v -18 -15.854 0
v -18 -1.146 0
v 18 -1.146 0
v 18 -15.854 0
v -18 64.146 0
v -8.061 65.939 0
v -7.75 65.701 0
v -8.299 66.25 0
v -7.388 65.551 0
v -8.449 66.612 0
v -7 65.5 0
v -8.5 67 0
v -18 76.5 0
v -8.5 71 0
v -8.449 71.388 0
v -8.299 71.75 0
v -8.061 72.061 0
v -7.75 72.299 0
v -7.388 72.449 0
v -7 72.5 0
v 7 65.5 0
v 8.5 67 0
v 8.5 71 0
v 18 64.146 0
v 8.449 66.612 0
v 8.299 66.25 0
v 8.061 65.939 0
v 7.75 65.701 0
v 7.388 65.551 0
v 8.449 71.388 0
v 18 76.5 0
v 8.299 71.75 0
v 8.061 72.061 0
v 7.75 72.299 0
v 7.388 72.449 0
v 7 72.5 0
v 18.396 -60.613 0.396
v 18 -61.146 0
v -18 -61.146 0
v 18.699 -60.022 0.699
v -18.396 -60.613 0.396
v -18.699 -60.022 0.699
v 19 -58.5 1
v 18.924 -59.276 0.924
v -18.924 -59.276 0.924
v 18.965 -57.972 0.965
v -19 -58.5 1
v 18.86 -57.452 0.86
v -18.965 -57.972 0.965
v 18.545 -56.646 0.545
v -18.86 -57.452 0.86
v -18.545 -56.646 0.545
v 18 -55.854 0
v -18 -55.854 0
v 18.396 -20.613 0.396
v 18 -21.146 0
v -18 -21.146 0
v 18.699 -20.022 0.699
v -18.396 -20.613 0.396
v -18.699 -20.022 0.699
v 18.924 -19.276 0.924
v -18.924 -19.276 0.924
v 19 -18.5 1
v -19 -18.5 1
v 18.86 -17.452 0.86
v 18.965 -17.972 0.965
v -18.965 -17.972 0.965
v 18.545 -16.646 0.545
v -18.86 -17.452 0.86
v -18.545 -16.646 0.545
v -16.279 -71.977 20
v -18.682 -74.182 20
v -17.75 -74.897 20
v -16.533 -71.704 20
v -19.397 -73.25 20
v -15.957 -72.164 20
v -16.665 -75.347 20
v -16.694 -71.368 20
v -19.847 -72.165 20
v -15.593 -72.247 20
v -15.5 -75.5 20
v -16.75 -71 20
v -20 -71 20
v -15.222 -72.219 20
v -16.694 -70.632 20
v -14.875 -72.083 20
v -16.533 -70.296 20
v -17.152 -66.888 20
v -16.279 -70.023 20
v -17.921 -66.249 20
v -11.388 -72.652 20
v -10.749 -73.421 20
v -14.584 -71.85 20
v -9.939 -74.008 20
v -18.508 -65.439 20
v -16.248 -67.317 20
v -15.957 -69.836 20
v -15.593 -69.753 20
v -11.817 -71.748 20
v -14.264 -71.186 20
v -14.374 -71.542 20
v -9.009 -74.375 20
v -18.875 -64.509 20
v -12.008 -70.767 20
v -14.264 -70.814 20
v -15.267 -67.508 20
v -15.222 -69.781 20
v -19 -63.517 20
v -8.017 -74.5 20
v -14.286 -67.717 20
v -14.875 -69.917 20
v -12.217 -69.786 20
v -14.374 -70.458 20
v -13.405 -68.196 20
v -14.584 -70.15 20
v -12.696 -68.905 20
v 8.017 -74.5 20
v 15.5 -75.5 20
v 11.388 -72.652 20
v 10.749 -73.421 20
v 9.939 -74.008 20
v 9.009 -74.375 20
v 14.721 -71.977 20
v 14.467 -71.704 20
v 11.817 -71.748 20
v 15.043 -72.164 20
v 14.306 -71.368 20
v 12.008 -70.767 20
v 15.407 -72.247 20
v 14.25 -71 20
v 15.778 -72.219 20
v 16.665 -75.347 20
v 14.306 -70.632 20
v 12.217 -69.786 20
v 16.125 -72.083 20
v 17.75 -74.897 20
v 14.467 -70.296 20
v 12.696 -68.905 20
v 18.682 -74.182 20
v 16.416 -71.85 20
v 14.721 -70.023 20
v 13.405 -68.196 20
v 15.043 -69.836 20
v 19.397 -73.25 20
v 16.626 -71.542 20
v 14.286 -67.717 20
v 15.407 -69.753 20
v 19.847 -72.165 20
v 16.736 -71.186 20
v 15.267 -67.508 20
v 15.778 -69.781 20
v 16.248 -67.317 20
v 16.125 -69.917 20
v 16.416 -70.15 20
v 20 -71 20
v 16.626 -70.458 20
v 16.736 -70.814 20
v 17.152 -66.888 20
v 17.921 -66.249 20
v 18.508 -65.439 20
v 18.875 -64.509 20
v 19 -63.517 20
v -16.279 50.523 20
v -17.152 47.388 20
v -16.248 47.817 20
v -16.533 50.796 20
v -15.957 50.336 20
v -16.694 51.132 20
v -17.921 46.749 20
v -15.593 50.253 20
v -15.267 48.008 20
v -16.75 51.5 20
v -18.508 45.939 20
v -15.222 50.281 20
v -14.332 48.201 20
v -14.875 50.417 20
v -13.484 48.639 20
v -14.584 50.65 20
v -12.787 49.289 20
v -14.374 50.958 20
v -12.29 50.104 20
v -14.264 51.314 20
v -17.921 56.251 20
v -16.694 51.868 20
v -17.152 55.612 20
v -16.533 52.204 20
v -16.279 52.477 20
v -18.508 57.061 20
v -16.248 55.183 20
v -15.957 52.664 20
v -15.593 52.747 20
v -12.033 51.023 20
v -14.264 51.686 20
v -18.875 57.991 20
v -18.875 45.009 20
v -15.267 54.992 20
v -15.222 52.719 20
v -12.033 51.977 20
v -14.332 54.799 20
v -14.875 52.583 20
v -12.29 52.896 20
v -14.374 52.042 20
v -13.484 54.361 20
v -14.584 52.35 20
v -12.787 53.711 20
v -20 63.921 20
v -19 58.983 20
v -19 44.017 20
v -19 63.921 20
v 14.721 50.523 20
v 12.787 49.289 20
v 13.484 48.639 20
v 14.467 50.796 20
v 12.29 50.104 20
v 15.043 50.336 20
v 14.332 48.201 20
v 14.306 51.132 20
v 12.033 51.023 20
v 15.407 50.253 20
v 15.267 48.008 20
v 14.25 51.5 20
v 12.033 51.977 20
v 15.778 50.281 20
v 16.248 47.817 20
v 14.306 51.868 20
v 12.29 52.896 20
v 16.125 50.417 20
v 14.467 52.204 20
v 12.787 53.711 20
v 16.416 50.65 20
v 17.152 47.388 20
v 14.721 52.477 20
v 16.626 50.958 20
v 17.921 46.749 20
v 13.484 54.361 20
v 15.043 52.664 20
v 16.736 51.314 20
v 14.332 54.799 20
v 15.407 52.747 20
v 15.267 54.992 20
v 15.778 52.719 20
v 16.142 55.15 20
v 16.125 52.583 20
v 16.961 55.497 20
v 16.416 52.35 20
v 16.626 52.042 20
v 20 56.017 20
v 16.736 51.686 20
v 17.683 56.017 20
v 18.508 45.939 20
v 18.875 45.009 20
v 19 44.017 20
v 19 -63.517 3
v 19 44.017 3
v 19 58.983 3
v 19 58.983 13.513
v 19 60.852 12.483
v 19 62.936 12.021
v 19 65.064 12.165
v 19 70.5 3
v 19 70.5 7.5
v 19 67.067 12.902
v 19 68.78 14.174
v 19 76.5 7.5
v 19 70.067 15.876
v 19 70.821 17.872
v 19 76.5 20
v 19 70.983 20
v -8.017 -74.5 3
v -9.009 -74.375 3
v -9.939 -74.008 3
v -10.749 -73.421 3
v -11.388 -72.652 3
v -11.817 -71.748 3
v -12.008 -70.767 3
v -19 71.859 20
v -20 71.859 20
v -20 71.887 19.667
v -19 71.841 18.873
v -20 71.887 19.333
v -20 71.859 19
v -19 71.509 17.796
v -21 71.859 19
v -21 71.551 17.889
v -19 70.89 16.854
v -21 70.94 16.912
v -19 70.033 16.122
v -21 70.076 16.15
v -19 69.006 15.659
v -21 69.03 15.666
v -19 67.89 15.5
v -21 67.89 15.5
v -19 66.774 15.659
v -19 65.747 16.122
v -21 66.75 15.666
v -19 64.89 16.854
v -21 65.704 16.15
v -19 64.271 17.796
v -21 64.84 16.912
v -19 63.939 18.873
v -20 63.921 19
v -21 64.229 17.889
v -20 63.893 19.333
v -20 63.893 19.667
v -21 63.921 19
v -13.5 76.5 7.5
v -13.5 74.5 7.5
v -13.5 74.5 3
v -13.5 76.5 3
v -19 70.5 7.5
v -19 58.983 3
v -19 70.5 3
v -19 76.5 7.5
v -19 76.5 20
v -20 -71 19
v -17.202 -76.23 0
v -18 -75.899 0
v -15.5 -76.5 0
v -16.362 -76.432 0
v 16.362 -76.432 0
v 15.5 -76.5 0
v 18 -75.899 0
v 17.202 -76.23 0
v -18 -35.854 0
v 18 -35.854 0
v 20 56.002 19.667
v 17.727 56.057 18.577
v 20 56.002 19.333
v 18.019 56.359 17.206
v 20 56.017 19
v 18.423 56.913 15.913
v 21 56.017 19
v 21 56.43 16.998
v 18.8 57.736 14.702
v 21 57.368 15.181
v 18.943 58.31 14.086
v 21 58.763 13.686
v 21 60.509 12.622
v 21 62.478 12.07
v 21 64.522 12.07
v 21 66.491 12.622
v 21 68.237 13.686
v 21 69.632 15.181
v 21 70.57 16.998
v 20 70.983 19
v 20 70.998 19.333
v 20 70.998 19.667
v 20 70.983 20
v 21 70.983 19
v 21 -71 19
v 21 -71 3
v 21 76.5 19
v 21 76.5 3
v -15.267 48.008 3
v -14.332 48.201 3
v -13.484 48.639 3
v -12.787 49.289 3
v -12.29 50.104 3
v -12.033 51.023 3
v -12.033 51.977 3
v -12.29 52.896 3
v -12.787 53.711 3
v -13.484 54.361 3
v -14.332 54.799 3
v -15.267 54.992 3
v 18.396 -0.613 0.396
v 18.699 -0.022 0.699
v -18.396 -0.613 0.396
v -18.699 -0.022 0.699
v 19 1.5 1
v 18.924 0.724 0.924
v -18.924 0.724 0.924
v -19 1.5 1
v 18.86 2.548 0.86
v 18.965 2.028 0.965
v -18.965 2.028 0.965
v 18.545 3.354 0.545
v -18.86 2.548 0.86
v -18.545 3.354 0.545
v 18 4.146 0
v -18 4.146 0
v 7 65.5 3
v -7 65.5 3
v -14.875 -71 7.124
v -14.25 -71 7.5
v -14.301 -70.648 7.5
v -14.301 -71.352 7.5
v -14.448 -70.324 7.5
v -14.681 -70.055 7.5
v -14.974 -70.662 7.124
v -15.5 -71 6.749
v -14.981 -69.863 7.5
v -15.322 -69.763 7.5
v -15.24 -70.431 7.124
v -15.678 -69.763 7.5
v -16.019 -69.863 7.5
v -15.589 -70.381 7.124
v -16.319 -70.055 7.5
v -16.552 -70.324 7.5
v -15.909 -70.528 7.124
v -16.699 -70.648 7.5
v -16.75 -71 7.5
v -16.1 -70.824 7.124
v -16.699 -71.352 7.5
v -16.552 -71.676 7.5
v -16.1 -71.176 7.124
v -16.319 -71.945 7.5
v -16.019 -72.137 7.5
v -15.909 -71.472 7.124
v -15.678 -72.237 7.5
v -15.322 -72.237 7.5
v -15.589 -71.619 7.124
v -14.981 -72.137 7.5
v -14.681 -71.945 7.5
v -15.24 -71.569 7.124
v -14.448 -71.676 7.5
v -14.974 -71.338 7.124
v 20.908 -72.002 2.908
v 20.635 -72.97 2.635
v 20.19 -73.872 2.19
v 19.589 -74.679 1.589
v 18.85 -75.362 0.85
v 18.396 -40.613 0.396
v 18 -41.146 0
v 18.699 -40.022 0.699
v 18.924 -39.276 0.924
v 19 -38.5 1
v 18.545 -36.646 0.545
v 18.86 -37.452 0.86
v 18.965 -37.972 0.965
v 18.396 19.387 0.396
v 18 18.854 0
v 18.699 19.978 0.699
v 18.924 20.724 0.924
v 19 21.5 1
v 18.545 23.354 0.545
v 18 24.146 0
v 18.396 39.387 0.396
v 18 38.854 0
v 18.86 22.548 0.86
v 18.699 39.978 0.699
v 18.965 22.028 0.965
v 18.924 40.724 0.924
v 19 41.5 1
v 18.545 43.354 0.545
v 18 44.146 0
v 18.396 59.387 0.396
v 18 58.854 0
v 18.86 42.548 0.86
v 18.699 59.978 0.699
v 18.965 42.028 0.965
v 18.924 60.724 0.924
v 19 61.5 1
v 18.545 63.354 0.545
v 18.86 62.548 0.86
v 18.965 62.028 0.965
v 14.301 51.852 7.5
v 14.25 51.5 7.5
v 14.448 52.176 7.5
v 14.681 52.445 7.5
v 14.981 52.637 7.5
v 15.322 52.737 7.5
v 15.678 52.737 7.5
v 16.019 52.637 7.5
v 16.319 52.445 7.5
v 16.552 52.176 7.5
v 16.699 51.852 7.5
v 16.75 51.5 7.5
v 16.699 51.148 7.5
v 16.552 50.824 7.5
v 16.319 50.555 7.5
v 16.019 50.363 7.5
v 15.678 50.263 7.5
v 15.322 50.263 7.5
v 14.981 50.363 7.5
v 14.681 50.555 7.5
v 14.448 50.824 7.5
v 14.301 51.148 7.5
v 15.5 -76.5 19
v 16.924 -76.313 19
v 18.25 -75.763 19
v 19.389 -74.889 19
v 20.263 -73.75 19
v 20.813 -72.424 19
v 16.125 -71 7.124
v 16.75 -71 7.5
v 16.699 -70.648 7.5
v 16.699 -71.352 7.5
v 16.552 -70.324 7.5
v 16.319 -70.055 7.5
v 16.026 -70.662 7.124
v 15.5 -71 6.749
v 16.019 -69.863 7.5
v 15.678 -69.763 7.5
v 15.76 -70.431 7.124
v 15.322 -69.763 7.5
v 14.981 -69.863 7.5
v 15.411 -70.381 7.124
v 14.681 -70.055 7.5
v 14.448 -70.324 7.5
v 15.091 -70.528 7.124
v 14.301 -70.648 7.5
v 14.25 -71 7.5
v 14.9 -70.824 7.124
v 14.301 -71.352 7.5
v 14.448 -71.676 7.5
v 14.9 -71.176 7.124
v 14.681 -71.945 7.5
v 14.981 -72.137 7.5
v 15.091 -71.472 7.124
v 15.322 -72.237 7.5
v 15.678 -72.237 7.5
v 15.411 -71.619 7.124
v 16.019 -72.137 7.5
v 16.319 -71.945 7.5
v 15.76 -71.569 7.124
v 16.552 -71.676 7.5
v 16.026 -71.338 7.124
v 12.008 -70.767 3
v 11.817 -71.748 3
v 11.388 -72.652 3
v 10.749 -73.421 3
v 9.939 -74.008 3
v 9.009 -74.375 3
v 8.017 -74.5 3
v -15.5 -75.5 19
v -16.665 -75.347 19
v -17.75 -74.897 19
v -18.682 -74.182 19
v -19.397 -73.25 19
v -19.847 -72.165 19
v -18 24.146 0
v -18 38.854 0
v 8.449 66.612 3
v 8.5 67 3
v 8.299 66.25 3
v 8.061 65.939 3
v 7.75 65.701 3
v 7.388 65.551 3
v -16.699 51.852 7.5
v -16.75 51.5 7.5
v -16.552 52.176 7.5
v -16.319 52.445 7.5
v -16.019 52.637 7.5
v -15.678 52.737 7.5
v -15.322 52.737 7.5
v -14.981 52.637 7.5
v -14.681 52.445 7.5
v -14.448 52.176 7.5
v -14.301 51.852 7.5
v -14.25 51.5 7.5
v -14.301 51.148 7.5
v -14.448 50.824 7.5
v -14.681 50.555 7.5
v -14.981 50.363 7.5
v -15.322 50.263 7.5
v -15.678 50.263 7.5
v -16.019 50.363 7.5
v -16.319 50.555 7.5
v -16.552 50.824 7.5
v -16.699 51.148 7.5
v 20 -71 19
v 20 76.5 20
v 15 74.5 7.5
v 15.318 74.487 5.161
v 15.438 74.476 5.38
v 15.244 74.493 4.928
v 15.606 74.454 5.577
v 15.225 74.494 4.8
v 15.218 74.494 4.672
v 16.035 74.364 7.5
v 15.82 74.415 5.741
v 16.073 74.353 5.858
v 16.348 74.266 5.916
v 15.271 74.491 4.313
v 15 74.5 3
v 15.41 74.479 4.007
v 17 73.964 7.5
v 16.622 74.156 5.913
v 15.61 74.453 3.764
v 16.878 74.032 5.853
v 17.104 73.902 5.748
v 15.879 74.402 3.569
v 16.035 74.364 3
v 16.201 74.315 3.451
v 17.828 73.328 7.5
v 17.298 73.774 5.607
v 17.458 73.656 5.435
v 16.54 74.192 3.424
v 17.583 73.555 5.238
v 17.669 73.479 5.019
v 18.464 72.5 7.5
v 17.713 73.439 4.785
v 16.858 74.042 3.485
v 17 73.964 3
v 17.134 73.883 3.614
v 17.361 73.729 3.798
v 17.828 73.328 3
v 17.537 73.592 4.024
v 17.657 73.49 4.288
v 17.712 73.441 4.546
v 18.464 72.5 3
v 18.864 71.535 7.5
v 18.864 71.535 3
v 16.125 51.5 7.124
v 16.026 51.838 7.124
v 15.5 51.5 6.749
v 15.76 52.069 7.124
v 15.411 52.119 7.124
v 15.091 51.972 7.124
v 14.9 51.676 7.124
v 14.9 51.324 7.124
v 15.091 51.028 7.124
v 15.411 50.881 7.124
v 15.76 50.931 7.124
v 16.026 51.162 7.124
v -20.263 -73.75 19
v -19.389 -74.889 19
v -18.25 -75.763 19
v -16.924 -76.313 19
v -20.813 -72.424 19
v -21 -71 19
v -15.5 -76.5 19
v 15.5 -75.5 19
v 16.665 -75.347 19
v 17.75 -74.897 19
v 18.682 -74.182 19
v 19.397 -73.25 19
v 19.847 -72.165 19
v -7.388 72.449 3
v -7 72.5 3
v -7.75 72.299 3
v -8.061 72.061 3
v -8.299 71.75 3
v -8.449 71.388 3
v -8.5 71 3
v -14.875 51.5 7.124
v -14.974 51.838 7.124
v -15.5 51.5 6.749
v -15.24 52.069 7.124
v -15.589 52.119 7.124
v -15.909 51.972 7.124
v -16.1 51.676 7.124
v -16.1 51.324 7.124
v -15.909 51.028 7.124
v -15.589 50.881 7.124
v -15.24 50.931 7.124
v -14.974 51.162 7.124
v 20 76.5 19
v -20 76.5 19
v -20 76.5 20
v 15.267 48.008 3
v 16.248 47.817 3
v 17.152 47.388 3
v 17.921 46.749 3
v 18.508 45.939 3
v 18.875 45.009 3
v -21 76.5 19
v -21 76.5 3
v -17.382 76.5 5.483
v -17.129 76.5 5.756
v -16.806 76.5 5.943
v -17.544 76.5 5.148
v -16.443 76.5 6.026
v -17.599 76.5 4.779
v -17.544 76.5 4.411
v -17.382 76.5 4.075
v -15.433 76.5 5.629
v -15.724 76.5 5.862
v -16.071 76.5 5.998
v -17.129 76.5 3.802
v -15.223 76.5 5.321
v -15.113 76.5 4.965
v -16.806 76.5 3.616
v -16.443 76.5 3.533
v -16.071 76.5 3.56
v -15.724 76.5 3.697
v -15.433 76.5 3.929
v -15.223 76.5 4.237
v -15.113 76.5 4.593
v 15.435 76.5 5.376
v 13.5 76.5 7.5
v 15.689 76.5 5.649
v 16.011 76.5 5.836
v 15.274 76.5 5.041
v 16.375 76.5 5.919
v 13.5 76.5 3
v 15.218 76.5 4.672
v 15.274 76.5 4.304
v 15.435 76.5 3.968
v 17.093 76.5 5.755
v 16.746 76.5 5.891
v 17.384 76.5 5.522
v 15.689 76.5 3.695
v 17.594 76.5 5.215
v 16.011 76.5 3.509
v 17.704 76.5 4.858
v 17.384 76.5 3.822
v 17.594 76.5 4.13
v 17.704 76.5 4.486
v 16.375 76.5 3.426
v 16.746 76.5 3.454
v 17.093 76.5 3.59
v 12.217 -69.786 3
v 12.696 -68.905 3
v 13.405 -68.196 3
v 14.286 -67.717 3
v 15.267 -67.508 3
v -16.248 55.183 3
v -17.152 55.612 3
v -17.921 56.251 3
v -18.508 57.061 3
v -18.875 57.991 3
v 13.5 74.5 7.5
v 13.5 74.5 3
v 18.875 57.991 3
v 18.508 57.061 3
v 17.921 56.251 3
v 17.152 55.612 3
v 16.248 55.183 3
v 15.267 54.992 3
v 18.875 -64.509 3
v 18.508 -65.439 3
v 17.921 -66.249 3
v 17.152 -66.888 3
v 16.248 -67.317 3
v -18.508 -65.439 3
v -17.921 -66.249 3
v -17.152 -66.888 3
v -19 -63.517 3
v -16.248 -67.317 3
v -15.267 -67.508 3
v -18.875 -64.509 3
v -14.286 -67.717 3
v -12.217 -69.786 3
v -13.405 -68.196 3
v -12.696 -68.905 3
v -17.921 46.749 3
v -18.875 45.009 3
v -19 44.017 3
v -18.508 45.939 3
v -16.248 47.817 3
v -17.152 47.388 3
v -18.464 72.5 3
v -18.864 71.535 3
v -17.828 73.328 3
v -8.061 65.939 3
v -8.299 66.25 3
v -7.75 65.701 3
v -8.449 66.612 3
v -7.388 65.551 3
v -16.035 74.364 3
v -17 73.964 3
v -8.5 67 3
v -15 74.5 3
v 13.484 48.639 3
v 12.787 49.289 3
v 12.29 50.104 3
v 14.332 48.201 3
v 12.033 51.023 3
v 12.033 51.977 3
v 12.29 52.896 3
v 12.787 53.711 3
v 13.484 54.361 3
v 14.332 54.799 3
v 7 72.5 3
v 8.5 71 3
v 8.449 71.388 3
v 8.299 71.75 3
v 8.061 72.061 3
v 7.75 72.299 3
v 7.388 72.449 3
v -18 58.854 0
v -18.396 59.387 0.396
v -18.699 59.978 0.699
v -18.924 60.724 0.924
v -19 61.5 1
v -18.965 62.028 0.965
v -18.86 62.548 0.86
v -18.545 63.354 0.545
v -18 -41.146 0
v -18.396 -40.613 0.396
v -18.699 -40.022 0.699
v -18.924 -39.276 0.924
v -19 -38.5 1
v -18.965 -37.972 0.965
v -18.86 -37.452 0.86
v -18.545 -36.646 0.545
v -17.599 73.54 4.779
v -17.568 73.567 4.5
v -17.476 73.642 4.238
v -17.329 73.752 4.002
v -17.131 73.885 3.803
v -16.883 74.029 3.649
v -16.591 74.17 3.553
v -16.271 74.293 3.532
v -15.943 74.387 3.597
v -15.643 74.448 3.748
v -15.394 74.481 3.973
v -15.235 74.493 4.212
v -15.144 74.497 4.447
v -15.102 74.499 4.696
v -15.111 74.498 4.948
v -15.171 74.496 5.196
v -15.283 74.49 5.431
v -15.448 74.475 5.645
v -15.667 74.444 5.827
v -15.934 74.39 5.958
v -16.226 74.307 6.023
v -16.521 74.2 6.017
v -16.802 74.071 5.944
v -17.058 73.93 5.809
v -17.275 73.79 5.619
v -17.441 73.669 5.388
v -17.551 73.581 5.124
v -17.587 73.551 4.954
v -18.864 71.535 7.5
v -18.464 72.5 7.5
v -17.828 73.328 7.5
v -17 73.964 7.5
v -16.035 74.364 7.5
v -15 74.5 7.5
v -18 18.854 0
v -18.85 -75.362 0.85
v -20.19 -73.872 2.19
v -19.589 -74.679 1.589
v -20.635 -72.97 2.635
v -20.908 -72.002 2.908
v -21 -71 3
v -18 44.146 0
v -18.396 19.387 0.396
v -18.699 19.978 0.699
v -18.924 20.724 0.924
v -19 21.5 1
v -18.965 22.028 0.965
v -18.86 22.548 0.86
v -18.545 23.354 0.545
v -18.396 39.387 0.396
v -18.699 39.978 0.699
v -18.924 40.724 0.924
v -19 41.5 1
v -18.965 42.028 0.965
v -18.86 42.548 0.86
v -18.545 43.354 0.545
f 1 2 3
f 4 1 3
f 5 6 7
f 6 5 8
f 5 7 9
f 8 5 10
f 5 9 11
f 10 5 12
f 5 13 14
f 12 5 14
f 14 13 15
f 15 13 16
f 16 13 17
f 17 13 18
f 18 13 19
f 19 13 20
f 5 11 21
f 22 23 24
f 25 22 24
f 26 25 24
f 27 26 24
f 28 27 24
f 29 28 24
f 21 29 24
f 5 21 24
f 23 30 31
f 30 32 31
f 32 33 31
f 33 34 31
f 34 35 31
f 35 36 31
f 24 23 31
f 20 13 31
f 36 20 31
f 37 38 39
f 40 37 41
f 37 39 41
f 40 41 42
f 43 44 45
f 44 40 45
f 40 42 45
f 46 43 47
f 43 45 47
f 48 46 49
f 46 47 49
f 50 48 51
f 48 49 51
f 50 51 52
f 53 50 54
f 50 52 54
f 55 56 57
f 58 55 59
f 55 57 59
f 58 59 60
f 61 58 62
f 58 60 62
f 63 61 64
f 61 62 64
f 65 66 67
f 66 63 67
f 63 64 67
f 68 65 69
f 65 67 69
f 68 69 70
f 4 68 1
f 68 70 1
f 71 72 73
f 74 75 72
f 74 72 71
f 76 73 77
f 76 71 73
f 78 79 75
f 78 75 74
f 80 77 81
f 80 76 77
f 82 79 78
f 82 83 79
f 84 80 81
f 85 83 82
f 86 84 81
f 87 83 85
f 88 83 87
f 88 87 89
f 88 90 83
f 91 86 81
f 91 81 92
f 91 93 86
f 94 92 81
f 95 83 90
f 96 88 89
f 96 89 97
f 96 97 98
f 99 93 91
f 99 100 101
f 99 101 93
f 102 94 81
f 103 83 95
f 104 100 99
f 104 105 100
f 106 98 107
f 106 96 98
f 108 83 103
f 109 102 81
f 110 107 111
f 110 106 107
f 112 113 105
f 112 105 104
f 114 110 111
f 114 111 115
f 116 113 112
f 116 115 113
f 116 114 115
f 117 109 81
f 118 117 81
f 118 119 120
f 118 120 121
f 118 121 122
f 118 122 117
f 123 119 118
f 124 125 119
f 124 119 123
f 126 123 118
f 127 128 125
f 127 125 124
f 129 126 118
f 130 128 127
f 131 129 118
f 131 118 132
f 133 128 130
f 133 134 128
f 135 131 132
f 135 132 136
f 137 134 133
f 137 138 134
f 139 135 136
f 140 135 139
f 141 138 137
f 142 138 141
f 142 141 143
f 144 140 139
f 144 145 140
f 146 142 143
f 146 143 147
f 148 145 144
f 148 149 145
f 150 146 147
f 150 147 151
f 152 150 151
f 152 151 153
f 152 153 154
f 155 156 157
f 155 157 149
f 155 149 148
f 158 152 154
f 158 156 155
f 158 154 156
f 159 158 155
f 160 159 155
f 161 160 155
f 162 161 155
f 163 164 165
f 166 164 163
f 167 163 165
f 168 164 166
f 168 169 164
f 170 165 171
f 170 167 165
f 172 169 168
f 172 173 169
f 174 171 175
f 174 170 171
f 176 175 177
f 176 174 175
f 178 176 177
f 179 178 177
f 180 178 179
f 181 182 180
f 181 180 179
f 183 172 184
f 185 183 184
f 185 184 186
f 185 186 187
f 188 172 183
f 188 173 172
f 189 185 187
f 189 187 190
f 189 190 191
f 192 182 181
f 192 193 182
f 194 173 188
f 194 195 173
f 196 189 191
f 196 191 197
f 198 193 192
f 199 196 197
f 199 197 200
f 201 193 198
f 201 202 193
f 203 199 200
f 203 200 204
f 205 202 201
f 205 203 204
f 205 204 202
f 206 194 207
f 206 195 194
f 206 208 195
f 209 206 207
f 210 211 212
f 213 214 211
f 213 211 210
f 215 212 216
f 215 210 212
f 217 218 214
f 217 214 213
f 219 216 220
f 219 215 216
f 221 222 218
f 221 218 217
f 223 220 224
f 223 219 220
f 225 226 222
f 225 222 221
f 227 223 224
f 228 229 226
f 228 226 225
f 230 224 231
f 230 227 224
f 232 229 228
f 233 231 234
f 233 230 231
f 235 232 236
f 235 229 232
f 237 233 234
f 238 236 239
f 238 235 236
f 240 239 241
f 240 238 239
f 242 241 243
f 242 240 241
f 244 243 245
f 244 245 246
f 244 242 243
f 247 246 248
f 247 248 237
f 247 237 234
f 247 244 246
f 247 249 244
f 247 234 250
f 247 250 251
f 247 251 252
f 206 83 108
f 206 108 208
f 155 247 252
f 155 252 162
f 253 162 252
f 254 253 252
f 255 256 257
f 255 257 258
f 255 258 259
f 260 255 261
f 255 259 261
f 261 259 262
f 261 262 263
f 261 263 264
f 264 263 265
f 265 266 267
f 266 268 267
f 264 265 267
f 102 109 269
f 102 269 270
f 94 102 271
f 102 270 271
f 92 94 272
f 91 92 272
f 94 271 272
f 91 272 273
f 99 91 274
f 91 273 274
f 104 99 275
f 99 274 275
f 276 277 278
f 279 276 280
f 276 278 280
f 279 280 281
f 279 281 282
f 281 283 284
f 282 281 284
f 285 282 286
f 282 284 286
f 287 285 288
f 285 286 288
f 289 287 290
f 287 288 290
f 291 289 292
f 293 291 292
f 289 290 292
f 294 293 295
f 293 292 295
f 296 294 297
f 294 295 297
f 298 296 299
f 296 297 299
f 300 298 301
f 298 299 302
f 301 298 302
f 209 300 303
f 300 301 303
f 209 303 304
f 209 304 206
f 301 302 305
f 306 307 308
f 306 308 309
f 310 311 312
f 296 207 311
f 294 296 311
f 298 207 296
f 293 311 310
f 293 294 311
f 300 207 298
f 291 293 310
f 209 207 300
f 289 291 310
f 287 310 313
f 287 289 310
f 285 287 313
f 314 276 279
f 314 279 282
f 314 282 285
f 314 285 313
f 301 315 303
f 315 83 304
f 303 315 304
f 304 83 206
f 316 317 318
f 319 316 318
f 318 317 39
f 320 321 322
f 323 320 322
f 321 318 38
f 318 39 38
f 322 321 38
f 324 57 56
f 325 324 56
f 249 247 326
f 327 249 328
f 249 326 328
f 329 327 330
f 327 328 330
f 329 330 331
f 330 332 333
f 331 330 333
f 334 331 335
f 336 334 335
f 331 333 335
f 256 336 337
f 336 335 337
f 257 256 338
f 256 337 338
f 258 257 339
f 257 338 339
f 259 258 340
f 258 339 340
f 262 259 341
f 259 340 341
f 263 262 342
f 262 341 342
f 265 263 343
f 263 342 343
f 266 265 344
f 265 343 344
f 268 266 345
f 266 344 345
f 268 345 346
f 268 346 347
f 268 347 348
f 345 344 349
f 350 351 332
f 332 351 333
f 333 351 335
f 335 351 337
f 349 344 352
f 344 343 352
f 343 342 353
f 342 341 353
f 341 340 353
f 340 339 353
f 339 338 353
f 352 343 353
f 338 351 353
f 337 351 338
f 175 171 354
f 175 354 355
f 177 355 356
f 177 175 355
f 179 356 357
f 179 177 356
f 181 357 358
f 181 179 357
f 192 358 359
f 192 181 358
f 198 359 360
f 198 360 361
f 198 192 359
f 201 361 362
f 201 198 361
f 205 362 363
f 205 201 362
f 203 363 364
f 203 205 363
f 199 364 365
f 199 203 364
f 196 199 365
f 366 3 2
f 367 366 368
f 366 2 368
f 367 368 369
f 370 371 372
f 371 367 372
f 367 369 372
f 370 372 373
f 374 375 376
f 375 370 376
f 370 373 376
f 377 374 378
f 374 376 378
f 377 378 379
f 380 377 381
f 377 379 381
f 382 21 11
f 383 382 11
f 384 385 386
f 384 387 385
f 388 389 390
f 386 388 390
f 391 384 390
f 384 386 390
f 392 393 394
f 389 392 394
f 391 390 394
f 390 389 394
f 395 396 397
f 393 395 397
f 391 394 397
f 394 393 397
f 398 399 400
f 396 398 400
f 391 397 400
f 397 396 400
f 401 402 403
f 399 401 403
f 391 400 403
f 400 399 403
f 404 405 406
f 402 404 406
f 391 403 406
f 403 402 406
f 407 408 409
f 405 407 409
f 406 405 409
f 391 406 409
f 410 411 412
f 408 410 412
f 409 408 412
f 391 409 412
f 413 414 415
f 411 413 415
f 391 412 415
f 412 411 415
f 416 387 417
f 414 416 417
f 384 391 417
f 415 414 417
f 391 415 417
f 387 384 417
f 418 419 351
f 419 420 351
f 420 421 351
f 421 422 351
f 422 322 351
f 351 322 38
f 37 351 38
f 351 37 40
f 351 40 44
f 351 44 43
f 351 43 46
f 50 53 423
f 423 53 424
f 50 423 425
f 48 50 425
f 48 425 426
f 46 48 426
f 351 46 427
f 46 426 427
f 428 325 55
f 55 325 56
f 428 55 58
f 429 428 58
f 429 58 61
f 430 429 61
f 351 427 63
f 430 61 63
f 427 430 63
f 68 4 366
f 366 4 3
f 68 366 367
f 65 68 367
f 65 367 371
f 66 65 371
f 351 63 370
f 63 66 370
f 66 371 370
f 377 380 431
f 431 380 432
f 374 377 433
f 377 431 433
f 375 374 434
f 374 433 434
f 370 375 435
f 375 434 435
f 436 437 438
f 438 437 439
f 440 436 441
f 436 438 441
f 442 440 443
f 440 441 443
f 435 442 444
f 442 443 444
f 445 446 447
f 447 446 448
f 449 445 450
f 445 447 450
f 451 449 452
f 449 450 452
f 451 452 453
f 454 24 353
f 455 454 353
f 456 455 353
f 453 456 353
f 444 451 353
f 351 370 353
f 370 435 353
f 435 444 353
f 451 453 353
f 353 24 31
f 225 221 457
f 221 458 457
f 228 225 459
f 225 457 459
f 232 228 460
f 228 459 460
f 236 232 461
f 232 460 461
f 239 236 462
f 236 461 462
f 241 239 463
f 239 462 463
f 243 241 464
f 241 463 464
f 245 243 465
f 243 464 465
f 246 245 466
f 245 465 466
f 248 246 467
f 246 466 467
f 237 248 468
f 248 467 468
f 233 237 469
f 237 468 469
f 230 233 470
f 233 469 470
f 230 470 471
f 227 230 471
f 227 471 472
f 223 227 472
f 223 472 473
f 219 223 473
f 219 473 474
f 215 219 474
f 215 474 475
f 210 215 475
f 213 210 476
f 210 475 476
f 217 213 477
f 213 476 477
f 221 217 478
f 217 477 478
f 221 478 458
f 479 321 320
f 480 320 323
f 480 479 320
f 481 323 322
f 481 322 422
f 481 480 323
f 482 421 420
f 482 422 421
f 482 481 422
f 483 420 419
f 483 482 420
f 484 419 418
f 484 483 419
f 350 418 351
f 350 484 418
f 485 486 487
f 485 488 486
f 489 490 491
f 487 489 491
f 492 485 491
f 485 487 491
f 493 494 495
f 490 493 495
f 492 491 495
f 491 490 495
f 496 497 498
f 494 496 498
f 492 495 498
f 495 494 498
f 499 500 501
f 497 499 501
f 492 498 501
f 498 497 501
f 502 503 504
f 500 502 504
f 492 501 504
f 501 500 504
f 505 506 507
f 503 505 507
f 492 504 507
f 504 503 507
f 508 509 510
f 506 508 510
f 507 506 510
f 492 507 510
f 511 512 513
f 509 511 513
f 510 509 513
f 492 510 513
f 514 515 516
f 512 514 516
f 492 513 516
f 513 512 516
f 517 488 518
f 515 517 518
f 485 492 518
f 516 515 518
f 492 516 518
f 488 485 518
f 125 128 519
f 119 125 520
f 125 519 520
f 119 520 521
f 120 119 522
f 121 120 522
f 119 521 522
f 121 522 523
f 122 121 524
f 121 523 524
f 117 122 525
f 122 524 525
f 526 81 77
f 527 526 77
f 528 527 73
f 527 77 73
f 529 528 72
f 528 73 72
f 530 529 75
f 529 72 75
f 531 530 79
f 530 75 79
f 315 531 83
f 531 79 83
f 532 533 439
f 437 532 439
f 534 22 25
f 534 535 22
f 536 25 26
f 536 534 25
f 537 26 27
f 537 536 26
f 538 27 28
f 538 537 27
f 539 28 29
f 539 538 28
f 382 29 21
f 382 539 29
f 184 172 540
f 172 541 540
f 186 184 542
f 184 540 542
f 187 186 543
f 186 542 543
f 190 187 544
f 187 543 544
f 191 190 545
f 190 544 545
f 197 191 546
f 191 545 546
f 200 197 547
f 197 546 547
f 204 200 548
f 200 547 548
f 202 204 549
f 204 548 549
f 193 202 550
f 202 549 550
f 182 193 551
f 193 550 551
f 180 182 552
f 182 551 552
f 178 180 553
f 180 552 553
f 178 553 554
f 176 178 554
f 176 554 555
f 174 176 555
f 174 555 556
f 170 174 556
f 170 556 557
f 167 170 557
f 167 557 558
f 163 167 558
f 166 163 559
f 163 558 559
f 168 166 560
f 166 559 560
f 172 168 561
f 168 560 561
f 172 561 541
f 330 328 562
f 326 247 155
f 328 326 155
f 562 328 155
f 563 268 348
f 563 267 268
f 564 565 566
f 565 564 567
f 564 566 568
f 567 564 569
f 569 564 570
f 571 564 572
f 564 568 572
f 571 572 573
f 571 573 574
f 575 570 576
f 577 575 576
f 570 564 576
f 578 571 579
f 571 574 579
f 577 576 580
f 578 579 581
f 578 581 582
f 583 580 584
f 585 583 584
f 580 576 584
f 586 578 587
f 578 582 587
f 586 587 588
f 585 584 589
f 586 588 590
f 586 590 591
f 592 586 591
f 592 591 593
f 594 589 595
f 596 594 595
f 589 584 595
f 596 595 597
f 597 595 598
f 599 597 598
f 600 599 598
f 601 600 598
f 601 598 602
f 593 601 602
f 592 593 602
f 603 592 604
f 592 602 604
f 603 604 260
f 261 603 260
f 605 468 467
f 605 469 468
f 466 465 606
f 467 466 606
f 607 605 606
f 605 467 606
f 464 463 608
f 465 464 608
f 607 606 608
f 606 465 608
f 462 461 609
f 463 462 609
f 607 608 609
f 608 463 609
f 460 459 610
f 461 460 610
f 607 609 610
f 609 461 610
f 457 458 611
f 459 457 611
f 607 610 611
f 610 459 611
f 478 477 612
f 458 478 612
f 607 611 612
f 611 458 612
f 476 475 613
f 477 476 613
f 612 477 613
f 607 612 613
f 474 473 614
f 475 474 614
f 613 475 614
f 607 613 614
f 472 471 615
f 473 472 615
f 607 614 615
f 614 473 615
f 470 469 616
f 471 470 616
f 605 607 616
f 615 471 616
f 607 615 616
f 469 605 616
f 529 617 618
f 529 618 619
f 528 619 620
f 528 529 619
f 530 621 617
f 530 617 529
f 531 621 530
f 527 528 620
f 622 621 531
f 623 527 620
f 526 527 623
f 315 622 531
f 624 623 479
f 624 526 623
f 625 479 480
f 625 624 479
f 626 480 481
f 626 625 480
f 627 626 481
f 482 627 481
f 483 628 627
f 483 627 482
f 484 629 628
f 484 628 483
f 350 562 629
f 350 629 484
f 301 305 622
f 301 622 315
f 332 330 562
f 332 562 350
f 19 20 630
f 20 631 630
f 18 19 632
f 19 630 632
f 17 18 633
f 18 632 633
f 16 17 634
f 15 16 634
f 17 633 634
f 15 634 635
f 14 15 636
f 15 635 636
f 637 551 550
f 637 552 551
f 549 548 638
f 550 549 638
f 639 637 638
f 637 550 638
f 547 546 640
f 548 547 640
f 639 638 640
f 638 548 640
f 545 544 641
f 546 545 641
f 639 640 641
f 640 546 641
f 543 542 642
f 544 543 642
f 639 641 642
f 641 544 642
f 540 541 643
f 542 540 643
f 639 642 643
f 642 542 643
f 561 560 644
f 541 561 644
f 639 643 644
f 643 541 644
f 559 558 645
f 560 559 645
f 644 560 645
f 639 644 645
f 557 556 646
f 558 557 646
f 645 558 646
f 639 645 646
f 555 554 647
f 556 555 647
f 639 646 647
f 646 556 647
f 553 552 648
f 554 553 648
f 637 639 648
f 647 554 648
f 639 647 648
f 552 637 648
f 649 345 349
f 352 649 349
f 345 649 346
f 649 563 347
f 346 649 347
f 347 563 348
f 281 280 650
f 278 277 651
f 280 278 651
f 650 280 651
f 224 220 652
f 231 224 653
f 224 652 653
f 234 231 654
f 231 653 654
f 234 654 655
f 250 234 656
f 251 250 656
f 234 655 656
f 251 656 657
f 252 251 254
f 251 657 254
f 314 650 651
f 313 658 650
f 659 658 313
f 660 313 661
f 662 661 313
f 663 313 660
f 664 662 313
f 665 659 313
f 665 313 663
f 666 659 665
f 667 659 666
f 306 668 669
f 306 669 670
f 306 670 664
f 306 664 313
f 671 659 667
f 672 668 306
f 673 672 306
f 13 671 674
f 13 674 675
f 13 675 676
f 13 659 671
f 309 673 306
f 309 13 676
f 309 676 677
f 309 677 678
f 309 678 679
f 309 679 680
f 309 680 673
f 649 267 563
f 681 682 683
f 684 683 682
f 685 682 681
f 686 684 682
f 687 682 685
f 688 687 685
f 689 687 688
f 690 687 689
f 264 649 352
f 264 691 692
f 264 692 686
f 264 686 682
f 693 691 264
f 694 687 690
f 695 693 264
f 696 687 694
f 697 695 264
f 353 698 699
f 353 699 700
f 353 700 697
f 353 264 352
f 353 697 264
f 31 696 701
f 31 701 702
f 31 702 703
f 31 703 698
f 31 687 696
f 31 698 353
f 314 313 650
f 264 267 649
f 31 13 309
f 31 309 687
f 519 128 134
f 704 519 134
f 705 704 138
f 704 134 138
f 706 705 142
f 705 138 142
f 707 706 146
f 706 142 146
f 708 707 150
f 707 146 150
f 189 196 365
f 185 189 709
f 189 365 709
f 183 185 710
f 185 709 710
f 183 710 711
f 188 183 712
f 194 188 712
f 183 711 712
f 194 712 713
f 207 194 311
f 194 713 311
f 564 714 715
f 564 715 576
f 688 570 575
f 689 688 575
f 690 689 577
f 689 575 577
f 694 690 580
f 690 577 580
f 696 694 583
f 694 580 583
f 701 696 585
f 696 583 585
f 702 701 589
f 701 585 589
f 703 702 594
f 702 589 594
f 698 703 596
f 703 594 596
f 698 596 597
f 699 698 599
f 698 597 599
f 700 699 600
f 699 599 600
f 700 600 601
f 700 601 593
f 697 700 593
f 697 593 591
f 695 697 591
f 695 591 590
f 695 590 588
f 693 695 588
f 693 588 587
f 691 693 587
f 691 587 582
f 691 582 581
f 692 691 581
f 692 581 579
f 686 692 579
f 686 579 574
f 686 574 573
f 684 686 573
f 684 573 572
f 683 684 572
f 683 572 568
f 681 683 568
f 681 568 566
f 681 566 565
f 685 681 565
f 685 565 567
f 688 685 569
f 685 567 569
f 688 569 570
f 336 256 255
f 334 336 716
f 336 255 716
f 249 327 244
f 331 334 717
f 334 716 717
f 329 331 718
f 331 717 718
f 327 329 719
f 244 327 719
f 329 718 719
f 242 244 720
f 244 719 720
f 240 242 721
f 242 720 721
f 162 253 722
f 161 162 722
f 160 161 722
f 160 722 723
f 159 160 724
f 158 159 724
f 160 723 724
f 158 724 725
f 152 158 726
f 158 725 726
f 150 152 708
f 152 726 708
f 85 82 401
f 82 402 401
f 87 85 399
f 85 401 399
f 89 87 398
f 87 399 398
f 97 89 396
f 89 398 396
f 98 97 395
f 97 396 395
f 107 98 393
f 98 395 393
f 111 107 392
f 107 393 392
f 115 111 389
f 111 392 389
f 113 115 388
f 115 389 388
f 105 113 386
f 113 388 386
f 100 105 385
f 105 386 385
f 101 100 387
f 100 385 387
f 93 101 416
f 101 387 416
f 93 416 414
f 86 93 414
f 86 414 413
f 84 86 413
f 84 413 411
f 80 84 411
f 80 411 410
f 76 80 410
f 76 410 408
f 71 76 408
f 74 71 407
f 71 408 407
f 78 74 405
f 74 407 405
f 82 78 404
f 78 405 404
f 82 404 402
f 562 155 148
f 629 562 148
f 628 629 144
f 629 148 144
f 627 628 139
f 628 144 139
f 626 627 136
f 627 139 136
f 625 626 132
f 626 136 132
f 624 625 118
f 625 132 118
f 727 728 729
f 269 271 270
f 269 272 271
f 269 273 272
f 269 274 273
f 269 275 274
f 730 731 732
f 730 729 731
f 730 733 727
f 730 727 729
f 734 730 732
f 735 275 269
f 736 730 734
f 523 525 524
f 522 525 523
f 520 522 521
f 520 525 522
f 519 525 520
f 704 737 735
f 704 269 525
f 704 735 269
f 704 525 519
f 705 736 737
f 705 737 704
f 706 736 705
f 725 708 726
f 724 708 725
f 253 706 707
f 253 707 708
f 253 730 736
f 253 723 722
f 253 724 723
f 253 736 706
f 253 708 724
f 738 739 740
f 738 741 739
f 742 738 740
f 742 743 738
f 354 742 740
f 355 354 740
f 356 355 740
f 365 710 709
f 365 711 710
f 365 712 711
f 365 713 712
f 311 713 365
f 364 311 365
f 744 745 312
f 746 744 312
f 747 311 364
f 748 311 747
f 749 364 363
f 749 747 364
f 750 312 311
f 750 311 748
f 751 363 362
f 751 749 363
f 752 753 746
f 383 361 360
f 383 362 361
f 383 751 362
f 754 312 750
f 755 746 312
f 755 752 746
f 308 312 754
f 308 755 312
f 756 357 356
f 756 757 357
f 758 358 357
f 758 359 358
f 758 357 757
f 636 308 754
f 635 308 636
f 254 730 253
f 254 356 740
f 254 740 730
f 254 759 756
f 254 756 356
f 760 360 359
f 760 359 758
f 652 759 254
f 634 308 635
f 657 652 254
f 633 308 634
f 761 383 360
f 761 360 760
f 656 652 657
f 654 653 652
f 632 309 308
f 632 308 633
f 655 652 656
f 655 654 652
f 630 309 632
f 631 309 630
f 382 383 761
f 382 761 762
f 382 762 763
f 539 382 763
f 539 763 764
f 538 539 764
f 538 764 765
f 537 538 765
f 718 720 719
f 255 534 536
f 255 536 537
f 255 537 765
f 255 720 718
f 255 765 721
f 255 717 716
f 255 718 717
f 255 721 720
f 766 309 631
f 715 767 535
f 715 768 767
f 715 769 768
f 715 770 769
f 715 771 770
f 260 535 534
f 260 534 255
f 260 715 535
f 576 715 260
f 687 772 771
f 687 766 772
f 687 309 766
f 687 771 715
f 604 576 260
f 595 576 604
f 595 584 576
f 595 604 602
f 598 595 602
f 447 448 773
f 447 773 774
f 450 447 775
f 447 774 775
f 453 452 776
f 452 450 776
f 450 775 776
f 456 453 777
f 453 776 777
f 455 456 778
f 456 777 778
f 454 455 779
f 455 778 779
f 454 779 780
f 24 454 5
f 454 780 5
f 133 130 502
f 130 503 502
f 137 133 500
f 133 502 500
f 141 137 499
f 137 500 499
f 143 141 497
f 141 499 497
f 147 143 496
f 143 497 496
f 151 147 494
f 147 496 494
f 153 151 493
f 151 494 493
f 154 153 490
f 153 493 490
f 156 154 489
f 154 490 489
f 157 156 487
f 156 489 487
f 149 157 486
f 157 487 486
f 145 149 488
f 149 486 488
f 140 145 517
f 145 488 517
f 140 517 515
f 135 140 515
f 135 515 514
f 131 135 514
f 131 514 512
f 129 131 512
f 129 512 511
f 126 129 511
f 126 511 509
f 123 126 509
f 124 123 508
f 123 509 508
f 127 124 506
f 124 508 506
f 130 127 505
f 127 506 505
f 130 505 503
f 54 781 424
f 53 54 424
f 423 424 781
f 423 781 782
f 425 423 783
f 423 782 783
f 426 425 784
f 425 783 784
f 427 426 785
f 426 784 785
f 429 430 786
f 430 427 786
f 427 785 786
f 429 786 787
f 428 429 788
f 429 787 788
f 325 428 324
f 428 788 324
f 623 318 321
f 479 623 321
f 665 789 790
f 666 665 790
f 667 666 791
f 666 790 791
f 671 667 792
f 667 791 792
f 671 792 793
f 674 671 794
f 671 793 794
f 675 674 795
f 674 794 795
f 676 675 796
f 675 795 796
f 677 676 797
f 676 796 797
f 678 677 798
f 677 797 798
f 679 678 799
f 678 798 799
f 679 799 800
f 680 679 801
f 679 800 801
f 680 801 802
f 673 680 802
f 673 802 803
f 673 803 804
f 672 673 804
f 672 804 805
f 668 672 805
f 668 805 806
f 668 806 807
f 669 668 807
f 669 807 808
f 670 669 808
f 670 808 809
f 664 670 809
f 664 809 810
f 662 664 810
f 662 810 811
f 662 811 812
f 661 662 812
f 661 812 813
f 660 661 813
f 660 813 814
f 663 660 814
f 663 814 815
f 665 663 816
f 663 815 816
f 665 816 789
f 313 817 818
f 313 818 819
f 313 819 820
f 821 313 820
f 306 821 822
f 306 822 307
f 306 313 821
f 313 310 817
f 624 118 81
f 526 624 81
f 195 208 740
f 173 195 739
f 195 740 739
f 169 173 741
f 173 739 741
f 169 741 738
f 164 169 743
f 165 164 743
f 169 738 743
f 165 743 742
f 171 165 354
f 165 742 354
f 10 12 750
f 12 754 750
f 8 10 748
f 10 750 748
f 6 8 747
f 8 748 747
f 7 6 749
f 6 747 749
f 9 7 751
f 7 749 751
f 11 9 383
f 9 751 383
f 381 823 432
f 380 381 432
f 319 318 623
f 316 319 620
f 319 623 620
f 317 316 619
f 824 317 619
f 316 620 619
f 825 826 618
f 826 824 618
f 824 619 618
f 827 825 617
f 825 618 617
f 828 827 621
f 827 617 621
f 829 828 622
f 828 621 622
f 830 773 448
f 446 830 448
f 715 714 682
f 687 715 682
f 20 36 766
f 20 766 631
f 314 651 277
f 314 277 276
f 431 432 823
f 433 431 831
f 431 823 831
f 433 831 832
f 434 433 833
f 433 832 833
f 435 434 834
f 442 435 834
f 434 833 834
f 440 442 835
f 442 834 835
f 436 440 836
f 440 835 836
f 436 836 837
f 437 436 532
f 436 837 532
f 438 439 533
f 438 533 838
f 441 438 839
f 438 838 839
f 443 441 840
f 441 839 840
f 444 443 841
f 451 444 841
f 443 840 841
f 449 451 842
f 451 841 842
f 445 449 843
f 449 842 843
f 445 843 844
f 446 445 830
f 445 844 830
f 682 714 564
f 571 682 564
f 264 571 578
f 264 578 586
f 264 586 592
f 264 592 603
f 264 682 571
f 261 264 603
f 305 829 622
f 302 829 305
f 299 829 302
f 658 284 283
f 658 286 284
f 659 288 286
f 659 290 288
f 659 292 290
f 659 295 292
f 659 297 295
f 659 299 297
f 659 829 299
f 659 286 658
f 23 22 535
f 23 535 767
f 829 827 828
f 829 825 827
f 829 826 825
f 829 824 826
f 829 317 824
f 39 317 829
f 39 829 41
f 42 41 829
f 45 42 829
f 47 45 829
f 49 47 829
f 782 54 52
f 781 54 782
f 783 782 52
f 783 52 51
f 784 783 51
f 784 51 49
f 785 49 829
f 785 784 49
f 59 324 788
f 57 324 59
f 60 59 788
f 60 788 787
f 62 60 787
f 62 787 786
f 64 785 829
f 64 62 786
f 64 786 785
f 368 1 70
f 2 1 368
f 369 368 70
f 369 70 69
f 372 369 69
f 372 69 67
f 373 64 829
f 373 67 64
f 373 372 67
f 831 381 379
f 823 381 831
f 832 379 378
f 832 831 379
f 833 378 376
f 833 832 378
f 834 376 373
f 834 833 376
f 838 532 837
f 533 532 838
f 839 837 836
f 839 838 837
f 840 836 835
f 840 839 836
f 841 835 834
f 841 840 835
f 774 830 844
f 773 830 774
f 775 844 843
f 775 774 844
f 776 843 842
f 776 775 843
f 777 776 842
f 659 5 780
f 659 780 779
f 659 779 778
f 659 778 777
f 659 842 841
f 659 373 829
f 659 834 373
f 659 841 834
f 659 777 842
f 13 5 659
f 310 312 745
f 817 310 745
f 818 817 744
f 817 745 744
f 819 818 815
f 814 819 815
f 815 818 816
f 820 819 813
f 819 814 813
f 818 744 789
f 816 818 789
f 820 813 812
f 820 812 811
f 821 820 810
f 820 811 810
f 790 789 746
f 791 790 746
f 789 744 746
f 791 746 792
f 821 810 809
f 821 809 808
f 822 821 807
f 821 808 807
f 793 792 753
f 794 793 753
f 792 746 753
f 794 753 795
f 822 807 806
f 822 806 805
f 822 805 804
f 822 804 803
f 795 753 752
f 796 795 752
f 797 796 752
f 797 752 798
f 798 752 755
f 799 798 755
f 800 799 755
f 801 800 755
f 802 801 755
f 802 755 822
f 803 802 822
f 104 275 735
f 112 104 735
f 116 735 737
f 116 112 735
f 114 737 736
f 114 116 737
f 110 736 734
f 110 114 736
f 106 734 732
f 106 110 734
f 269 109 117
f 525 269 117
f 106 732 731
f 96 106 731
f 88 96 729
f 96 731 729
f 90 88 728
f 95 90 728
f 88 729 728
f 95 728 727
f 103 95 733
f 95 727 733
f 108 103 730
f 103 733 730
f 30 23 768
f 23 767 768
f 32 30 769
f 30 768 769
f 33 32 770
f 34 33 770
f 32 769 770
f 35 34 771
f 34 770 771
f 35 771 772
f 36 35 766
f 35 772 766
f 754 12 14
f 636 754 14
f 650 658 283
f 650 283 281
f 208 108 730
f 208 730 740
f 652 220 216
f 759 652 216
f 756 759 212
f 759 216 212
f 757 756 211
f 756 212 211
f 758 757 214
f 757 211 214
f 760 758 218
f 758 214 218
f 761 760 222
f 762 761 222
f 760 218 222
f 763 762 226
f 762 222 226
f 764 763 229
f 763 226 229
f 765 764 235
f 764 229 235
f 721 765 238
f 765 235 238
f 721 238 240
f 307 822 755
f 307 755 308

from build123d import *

# Parameters (mm, degrees)
SKETCH_1_W           = 42
SKETCH_1_H           = 153
EXTRUDE_1_DEPTH      = 20
SKETCH_2_W           = 38
SKETCH_2_H           = 149
CUT_EXTRUDE_1_DEPTH  = 17
EXTRUDE_3_DEPTH      = 17
FILLET_START         = 2
FILLET_2_DEPTH       = 18
CHAMFER_1_SIZE       = 3
CUT_EXTRUDE_3_DEPTH  = 82.812285141
SKETCH_8_R           = 4
CUT_EXTRUDE_4_DEPTH  = 90.533513279
SKETCH_13_W          = 27
SKETCH_13_H          = 9.8440201
CUT_EXTRUDE_6_DEPTH  = 17
SKETCH_14_W          = 38
SKETCH_14_H          = 15.071373518
CUT_EXTRUDE_7_DEPTH  = 12.5
CUT_EXTRUDE_8_DEPTH  = 1
M3X0_51_D            = 2.5
M3X0_51_DEPTH        = 12.5
M3X0_51_TIP          = 0.751075774
M3X0_52_D            = 2.5
M3X0_52_DEPTH        = 12.5
M3X0_52_TIP          = 0.751075774
CUT_EXTRUDE_9_REACH  = 91.534
SKETCH_22_R          = 7.5
CUT_EXTRUDE_10_REACH = 91.534
SKETCH_23_R          = 4
CUT_EXTRUDE_11_REACH = 83.812
SKETCH_24_W          = 17
SKETCH_24_H          = 7
FILLET_3_R           = 1.5


with BuildPart() as part:
    # Эскиз1 → Бобышка-Вытянуть1 (new body)
    with BuildSketch(Plane.XY):
        Rectangle(SKETCH_1_W, SKETCH_1_H)
    extrude(amount=EXTRUDE_1_DEPTH)

    # Эскиз2 → Вырез-Вытянуть1 (cut)
    with BuildSketch(Plane.XY.offset(20)):
        Rectangle(SKETCH_2_W, SKETCH_2_H)
    extrude(amount=-CUT_EXTRUDE_1_DEPTH, mode=Mode.SUBTRACT)

    # Эскиз3 → Бобышка-Вытянуть3 (add)
    with BuildSketch(Plane.XY.offset(20)):
        with BuildLine():
            Line((-19, -71), (-19, -74.5))
            Line((-19, -74.5), (-15.5, -74.5))
            ThreePointArc((-15.5, -74.5), (-13.025126266, -68.525126266), (-19, -71))
        make_face()
        with BuildLine():
            Line((19, -71), (19, -74.5))
            Line((19, -74.5), (15.5, -74.5))
            ThreePointArc((15.5, -74.5), (13.025126266, -68.525126266), (19, -71))
        make_face()
        with BuildLine():
            Line((-15.5, 55), (-19, 55))
            Line((-19, 55), (-19, 48))
            Line((-19, 48), (-15.5, 48))
            ThreePointArc((-15.5, 48), (-12, 51.5), (-15.5, 55))
        make_face()
        with BuildLine():
            Line((15.5, 55), (19, 55))
            Line((19, 55), (19, 48))
            Line((19, 48), (15.5, 48))
            ThreePointArc((15.5, 48), (12, 51.5), (15.5, 55))
        make_face()
    extrude(amount=-EXTRUDE_3_DEPTH)

    # Скругление2: read off the stored shape, not the designer's step
    # Скругление2 outline → Скругление2 (add)
    with BuildSketch(Plane.XY.offset(FILLET_START)):
        with BuildLine():
            ThreePointArc((19, 58.983314774), (17.921186974, 56.25079457), (15.266666667, 54.992213561))
            ThreePointArc((15.266666667, 54.992213561), (15.383268392, 54.998052849), (15.5, 55))
            Line((15.5, 55), (19, 55))
            Line((19, 55), (19, 58.983314774))
        make_face()
        with BuildLine():
            ThreePointArc((15.5, 48), (15.383268392, 48.001947151), (15.266666667, 48.007786439))
            ThreePointArc((15.266666667, 48.007786439), (17.921186974, 46.74920543), (19, 44.016685226))
            Line((19, 44.016685226), (19, 48))
            Line((19, 48), (15.5, 48))
        make_face()
        with BuildLine():
            ThreePointArc((15, 74.5), (17.828427125, 73.328427125), (19, 70.5))
            Line((19, 70.5), (19, 74.5))
            Line((19, 74.5), (15, 74.5))
        make_face()
        with BuildLine():
            Line((19, -71), (19, -63.516685226))
            ThreePointArc((19, -63.516685226), (17.921186974, -66.24920543), (15.266666667, -67.507786439))
            ThreePointArc((15.266666667, -67.507786439), (17.890955179, -68.443961399), (19, -71))
        make_face()
        with BuildLine():
            ThreePointArc((-19, 70.5), (-17.828427125, 73.328427125), (-15, 74.5))
            Line((-15, 74.5), (-19, 74.5))
            Line((-19, 74.5), (-19, 70.5))
        make_face()
        with BuildLine():
            ThreePointArc((15.5, -74.5), (12.943961399, -73.390955179), (12.007786439, -70.766666667))
            ThreePointArc((12.007786439, -70.766666667), (10.74920543, -73.421186974), (8.016685226, -74.5))
            Line((8.016685226, -74.5), (15.5, -74.5))
        make_face()
        with BuildLine():
            ThreePointArc((-15.266666667, 54.992213561), (-17.921186974, 56.25079457), (-19, 58.983314774))
            Line((-19, 58.983314774), (-19, 55))
            Line((-19, 55), (-15.5, 55))
            ThreePointArc((-15.5, 55), (-15.383268392, 54.998052849), (-15.266666667, 54.992213561))
        make_face()
        with BuildLine():
            Line((-15.5, -74.5), (-8.016685226, -74.5))
            ThreePointArc((-8.016685226, -74.5), (-10.74920543, -73.421186974), (-12.007786439, -70.766666667))
            ThreePointArc((-12.007786439, -70.766666667), (-12.943961399, -73.390955179), (-15.5, -74.5))
        make_face()
        with BuildLine():
            ThreePointArc((-19, 44.016685226), (-17.921186974, 46.74920543), (-15.266666667, 48.007786439))
            ThreePointArc((-15.266666667, 48.007786439), (-15.383268392, 48.001947151), (-15.5, 48))
            Line((-15.5, 48), (-19, 48))
            Line((-19, 48), (-19, 44.016685226))
        make_face()
        with BuildLine():
            ThreePointArc((-19, -71), (-17.890955179, -68.443961399), (-15.266666667, -67.507786439))
            ThreePointArc((-15.266666667, -67.507786439), (-17.921186974, -66.24920543), (-19, -63.516685226))
            Line((-19, -63.516685226), (-19, -71))
        make_face()
    extrude(amount=FILLET_2_DEPTH)

    # Фаска1
    chamfer_1_edges = [part.edges().sort_by_distance(p)[0] for p in [
        (-21, 0, 0),
        (21, 0, 0),
    ]]
    chamfer(chamfer_1_edges, length=CHAMFER_1_SIZE)

    # Эскиз7 → Вырез-Вытянуть3 (cut, through all)
    with BuildSketch(Plane.XY.offset(20)):
        with BuildLine():
            Line((-21, -71), (-21, -76.5))
            Line((-21, -76.5), (-15.5, -76.5))
            ThreePointArc((-15.5, -76.5), (-19.389087297, -74.889087297), (-21, -71))
        make_face()
        with BuildLine():
            Line((21, -76.5), (15.5, -76.5))
            ThreePointArc((15.5, -76.5), (19.389087297, -74.889087297), (21, -71))
            Line((21, -71), (21, -76.5))
        make_face()
    extrude(amount=-CUT_EXTRUDE_3_DEPTH, mode=Mode.SUBTRACT)

    # Эскиз8 → Вырез-Вытянуть4 (cut, through all)
    with BuildSketch(Plane.ZY.offset(21)):
        with Locations((-3, -58.5)):
            Circle(SKETCH_8_R)
        with Locations((-3, -38.5)):
            Circle(SKETCH_8_R)
        with Locations((-3, -18.5)):
            Circle(SKETCH_8_R)
        with Locations((-3, 1.5)):
            Circle(SKETCH_8_R)
        with Locations((-3, 21.5)):
            Circle(SKETCH_8_R)
        with Locations((-3, 41.5)):
            Circle(SKETCH_8_R)
        with Locations((-3, 61.5)):
            Circle(SKETCH_8_R)
    extrude(amount=-CUT_EXTRUDE_4_DEPTH, mode=Mode.SUBTRACT)

    # Эскиз13 → Вырез-Вытянуть6 (cut)
    with BuildSketch(Plane.XY.offset(20)):
        with Locations((0, 76.5)):
            Rectangle(SKETCH_13_W, SKETCH_13_H)
    extrude(amount=-CUT_EXTRUDE_6_DEPTH, mode=Mode.SUBTRACT)

    # Эскиз14 → Вырез-Вытянуть7 (cut)
    with BuildSketch(Plane.XY.offset(20)):
        with Locations((0, 76.5)):
            Rectangle(SKETCH_14_W, SKETCH_14_H)
    extrude(amount=-CUT_EXTRUDE_7_DEPTH, mode=Mode.SUBTRACT)

    # Эскиз15 → Вырез-Вытянуть8 (cut)
    with BuildSketch(Plane.XY.offset(20)):
        with BuildLine():
            Line((-21, 76.5), (-21, -71))
            ThreePointArc((-21, -71), (-19.389087297, -74.889087297), (-15.5, -76.5))
            Line((-15.5, -76.5), (15.5, -76.5))
            ThreePointArc((15.5, -76.5), (19.389087297, -74.889087297), (21, -71))
            Line((21, -71), (21, 76.5))
            Line((21, 76.5), (20, 76.5))
            Line((20, 76.5), (20, -71))
            ThreePointArc((20, -71), (18.681980515, -74.181980515), (15.5, -75.5))
            Line((15.5, -75.5), (-15.5, -75.5))
            ThreePointArc((-15.5, -75.5), (-18.681980515, -74.181980515), (-20, -71))
            Line((-20, -71), (-20, 76.5))
            Line((-20, 76.5), (-21, 76.5))
        make_face()
    extrude(amount=-CUT_EXTRUDE_8_DEPTH, mode=Mode.SUBTRACT)

    # Отверстие обработанное метчиком M3x0.51
    with Locations(Plane.XY.offset(20)):
        with Locations((-15.5, 51.5), (15.5, 51.5), (15.5, -71), (-15.5, -71)):
            Hole(M3X0_51_D / 2, depth=M3X0_51_DEPTH)
            with Locations((0, 0, -(M3X0_51_DEPTH + M3X0_51_TIP / 2))):  # 118° drill point
                Cone(0, M3X0_51_D / 2, M3X0_51_TIP, mode=Mode.SUBTRACT)

    # Отверстие обработанное метчиком M3x0.52
    with Locations(Plane(origin=(0, 76.5, 0), x_dir=(1, 0, 0), z_dir=(0, 1, 0))):
        with Locations((-16.349186161, -4.77912666), (16.467977598, -4.67216637)):
            Hole(M3X0_52_D / 2, depth=M3X0_52_DEPTH)
            with Locations((0, 0, -(M3X0_52_DEPTH + M3X0_52_TIP / 2))):  # 118° drill point
                Cone(0, M3X0_52_D / 2, M3X0_52_TIP, mode=Mode.SUBTRACT)

    # Эскиз22 → Вырез-Вытянуть9 (cut, up to next)
    with BuildSketch(Plane(origin=(21, 0, 0), x_dir=(0, 0, -1), z_dir=(1, 0, 0)), mode=Mode.PRIVATE) as cut_extrude_9_sk1:
        with Locations((-19.5, 63.5)):
            Circle(SKETCH_22_R)
    cut_extrude_9_tool1 = extrude(cut_extrude_9_sk1.sketch, amount=-CUT_EXTRUDE_9_REACH, mode=Mode.PRIVATE) & part.part
    add(cut_extrude_9_tool1.solids().sort_by_distance((21, 63.5, 19.5))[0], mode=Mode.SUBTRACT)

    # Эскиз23 → Вырез-Вытянуть10 (cut, up to next)
    with BuildSketch(Plane.ZY.offset(21), mode=Mode.PRIVATE) as cut_extrude_10_sk1:
        with Locations((19.5, 67.89)):
            Circle(SKETCH_23_R)
    cut_extrude_10_tool1 = extrude(cut_extrude_10_sk1.sketch, amount=-CUT_EXTRUDE_10_REACH, mode=Mode.PRIVATE) & part.part
    add(cut_extrude_10_tool1.solids().sort_by_distance((-21, 67.89, 19.5))[0], mode=Mode.SUBTRACT)

    # Эскиз24 → Вырез-Вытянуть11 (cut, up to next)
    with BuildSketch(Plane(origin=(0, 0, 0), x_dir=(-1, 0, 0), z_dir=(0, 0, -1)), mode=Mode.PRIVATE) as cut_extrude_11_sk1:
        with Locations((0, 69)):
            Rectangle(SKETCH_24_W, SKETCH_24_H)
    cut_extrude_11_tool1 = extrude(cut_extrude_11_sk1.sketch, amount=-CUT_EXTRUDE_11_REACH, mode=Mode.PRIVATE) & part.part
    add(cut_extrude_11_tool1.solids().sort_by_distance((0, 69, 0))[0], mode=Mode.SUBTRACT)

    # Скругление3
    fillet_3_edges = [part.edges().sort_by_distance(p)[0] for p in [
        (-8.5, 72.5, 1.5),
        (-8.5, 65.5, 1.5),
        (8.5, 65.5, 1.5),
        (8.5, 72.5, 1.5),
    ]]
    fillet(fillet_3_edges, radius=FILLET_3_R)


solid = part.part
